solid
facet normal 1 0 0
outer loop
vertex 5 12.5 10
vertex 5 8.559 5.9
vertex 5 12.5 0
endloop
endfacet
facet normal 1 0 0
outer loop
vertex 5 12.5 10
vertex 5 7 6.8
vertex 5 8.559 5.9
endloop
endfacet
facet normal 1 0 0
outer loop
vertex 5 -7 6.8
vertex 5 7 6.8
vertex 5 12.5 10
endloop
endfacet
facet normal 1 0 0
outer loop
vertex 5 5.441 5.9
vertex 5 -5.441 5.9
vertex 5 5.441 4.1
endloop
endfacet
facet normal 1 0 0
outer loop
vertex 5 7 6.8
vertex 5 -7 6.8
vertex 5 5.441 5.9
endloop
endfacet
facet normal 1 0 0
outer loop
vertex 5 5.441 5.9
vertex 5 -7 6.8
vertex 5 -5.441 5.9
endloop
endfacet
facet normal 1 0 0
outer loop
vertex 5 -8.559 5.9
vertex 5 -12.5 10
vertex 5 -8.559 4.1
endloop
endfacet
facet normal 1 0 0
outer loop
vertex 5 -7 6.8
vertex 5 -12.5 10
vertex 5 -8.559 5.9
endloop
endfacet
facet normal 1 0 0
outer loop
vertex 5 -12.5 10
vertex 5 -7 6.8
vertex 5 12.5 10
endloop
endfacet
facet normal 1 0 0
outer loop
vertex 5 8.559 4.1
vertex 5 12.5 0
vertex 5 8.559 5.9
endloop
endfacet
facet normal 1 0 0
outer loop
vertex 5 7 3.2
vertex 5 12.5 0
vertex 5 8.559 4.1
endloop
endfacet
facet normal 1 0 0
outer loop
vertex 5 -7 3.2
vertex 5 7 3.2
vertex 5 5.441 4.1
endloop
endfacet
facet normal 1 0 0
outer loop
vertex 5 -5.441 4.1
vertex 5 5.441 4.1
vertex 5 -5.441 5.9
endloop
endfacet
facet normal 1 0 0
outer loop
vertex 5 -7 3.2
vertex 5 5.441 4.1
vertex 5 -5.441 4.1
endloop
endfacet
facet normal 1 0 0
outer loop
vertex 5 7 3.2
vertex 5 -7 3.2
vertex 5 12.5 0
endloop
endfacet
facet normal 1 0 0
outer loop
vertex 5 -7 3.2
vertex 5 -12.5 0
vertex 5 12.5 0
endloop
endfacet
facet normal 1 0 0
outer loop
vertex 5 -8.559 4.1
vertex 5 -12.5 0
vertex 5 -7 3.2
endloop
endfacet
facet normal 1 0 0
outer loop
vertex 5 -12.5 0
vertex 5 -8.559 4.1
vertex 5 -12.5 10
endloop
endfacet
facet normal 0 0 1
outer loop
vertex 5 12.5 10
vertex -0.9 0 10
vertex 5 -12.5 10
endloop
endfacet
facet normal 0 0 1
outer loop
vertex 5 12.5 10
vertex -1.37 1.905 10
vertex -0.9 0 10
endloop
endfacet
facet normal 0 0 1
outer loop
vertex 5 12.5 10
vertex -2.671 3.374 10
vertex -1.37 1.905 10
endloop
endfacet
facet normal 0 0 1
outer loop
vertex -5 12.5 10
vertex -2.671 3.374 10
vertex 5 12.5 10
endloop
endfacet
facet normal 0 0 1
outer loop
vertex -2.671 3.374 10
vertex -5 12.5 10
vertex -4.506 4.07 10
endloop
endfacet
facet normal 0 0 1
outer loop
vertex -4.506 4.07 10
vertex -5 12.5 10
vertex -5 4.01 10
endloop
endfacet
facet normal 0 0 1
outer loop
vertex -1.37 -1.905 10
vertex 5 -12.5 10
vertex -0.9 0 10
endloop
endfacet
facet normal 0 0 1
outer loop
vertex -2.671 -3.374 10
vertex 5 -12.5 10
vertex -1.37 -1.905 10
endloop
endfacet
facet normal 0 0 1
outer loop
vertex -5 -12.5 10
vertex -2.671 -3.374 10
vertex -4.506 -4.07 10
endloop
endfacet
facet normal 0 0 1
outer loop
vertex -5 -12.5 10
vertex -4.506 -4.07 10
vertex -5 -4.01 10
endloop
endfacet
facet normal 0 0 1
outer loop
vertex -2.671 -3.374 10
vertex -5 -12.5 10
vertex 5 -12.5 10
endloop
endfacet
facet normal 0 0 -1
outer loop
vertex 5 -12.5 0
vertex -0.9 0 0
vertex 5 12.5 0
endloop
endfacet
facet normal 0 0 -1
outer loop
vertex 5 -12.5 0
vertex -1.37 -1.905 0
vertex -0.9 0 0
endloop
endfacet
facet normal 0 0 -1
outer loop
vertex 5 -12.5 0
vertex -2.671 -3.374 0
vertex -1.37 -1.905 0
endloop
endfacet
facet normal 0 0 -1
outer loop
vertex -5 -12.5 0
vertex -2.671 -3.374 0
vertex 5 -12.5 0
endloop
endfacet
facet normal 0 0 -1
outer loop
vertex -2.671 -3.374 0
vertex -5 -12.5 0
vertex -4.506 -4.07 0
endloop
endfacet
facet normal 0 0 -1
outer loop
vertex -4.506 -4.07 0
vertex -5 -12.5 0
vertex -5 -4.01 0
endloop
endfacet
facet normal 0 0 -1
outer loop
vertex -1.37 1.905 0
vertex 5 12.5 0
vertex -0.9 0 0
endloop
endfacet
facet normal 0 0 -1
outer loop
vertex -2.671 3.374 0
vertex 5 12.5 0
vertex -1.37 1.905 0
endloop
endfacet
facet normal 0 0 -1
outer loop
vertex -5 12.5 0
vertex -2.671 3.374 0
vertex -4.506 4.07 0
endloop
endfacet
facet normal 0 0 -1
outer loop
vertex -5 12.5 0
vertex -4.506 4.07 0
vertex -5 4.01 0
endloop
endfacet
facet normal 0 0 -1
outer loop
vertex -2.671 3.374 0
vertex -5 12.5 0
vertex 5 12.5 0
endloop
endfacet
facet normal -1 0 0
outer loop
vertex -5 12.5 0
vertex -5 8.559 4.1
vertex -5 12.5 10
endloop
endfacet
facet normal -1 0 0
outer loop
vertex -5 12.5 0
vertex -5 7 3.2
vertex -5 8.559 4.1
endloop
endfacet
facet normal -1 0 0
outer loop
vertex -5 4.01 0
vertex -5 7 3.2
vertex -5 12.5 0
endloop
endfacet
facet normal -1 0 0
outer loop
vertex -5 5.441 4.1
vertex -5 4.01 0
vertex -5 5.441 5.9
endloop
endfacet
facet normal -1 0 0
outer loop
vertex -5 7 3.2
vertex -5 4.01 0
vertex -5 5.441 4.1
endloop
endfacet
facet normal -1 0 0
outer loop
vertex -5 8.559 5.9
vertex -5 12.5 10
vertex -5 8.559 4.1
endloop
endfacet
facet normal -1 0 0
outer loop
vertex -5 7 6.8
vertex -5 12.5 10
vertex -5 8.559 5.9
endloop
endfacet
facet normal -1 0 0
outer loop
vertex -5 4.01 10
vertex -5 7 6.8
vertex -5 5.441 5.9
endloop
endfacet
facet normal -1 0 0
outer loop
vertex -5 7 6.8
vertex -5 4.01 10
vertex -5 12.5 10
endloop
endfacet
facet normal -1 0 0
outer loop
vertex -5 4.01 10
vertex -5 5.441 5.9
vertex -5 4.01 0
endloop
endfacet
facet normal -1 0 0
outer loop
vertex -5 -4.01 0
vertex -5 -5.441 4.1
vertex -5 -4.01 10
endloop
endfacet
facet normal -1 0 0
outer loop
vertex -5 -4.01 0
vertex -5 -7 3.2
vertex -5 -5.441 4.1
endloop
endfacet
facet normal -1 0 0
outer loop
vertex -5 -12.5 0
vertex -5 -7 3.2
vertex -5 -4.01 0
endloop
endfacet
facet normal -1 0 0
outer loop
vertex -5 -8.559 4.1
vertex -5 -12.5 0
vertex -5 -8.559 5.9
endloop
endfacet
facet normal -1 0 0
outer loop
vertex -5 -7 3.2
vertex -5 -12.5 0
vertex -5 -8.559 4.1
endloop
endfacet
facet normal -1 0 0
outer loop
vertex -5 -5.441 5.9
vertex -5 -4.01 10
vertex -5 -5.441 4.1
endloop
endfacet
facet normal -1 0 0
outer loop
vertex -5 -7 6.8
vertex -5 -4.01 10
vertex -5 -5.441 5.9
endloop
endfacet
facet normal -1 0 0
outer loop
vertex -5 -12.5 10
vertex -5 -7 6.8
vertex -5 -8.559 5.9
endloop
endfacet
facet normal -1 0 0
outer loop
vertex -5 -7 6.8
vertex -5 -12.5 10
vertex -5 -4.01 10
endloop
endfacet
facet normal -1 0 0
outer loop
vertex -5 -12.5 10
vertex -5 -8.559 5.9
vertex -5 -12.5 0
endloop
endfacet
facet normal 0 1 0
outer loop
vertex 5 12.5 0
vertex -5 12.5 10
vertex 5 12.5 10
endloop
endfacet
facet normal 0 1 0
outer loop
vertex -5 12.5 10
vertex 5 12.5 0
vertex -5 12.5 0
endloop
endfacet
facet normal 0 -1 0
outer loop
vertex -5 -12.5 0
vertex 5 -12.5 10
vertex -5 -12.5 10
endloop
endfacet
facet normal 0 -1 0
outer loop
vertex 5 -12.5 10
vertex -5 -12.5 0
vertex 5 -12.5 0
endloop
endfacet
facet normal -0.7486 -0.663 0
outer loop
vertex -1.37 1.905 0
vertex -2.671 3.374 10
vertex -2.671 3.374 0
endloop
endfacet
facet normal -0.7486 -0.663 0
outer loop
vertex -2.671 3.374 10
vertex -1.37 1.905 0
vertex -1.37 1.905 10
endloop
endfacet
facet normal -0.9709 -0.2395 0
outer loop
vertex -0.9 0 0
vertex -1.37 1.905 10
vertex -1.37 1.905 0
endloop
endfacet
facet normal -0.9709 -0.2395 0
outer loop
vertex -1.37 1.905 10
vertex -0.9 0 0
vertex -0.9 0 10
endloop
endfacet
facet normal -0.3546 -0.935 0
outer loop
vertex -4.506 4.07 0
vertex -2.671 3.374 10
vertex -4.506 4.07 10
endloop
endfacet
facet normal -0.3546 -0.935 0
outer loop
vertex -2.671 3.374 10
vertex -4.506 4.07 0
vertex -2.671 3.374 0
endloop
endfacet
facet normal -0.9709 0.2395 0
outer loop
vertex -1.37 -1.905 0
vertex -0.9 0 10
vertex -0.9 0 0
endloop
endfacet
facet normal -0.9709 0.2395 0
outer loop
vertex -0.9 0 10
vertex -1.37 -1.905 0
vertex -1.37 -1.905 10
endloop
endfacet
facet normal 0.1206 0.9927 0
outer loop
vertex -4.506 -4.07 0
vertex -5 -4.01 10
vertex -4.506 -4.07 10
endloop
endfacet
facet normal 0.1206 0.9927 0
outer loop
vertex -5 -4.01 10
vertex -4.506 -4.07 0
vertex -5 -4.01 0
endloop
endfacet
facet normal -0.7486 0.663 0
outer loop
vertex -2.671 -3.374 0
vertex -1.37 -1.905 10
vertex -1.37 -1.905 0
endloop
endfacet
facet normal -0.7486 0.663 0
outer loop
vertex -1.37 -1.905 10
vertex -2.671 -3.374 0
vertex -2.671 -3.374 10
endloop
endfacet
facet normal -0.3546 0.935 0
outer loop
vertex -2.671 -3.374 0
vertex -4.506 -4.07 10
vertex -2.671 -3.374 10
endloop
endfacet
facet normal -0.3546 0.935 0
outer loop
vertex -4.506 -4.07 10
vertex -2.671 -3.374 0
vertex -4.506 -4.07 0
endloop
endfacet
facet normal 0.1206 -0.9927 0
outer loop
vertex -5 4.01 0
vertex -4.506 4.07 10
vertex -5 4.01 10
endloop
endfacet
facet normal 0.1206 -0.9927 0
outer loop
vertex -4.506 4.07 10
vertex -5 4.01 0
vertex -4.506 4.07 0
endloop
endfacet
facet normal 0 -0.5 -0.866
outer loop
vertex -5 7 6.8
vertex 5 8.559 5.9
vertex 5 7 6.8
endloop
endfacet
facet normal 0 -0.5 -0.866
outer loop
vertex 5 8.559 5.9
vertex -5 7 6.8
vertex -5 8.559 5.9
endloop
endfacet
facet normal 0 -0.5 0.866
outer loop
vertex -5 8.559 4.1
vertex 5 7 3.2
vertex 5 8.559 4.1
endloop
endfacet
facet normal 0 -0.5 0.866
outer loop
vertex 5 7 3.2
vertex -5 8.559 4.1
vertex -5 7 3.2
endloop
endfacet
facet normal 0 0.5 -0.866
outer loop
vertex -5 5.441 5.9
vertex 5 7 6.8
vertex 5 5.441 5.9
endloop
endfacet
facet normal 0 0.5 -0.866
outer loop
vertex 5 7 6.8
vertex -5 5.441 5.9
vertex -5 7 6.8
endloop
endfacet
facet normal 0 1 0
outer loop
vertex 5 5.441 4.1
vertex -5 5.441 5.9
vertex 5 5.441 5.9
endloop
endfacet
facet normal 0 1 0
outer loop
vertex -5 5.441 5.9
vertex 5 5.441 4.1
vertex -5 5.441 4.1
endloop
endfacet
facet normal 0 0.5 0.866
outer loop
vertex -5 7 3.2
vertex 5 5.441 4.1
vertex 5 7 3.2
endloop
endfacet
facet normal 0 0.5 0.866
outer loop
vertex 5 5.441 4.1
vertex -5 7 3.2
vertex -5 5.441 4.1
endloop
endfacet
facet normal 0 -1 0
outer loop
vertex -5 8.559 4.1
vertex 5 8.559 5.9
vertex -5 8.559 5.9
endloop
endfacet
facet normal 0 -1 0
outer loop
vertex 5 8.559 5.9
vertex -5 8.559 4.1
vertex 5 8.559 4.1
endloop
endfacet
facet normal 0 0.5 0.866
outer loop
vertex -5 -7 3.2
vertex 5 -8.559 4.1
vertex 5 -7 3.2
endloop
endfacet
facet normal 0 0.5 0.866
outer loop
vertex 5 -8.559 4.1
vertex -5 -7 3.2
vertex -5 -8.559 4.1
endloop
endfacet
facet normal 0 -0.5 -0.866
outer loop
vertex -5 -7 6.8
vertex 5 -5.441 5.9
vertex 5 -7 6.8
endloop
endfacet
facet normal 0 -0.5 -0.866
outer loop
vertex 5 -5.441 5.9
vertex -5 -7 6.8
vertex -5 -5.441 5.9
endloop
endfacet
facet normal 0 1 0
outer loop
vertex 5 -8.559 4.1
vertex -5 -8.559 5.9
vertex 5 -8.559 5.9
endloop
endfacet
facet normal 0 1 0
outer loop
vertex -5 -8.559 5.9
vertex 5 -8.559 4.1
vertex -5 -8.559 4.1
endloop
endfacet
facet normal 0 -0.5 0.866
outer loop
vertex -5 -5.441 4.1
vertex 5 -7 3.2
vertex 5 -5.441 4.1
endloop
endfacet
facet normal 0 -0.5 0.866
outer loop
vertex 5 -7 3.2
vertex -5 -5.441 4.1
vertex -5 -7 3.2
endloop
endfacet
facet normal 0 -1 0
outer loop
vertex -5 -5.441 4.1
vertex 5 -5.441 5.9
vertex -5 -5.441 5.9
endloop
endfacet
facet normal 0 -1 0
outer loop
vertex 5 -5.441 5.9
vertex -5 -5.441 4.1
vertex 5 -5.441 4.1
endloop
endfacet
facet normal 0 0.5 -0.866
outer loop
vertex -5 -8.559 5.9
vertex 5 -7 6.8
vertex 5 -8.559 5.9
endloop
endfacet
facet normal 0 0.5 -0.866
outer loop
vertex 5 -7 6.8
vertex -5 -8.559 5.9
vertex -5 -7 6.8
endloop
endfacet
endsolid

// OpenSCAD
// file: functions.scad
// PRUSA Mendel  
// Functions used in many files
// GNU GPL v3
// Josef Průša
// josefprusa@me.com
// prusadjs.cz
// http://www.reprap.org/wiki/Prusa_Mendel
// http://github.com/prusajr/PrusaMendel


module nut(d,h,horizontal=true){
cornerdiameter =  (d / 2) / cos (180 / 6);
cylinder(h = h, r = cornerdiameter, $fn = 6);
if(horizontal){
for(i = [1:6]){
	rotate([0,0,60*i]) translate([-cornerdiameter-0.2,0,0]) rotate([0,0,-45]) cube(size = [2,2,h]);
}}
}

// Based on nophead research
module polyhole(d,h) {
    n = max(round(2 * d),3);
    rotate([0,0,180])
        cylinder(h = h, r = (d / 2) / cos (180 / n), $fn = n);
}




module roundcorner(diameter){
	difference(){
		cube(size = [diameter,diameter,99], center = false);
		translate(v = [diameter, diameter, 0]) cylinder(h = 100, r=diameter, center=true);
	}
}
// file: metric.scad
// PRUSA Mendel  
// Default metric sizes
// GNU GPL v3
// Josef Průša
// josefprusa@me.com
// prusadjs.cz
// http://www.reprap.org/wiki/Prusa_Mendel
// http://github.com/prusajr/PrusaMendel

// DONT CHANGE THIS FILE! ALTER VALUES IN CONFIGURATION.SCAD INSTEAD

// RODS

threaded_rod_diameter = 8.7;
threaded_rod_diameter_horizontal = 8.7;
smooth_bar_diameter = 8;
smooth_bar_diameter_horizontal = 8.5;

// Nuts and bolts

m8_diameter = 9;
m8_nut_diameter = 14.1;

m4_diameter = 4.5;
m4_nut_diameter = 9;

m3_diameter = 3.6;
m3_nut_diameter = 5.3;
m3_nut_diameter_horizontal = 6.1;

// Bushing holder

bushing_core_diameter = smooth_bar_diameter;
bushing_material_thickness = 1;

// Motors

motor_shaft = 5.5;
// file: configuration.scad
// PRUSA Mendel  
// Configuration file
// GNU GPL v3
// Josef Průša
// josefprusa@me.com
// prusadjs.cz
// http://www.reprap.org/wiki/Prusa_Mendel
// http://github.com/prusajr/PrusaMendel

// PLEASE SELECT ONE OF THE CONFIGURATIONS BELOW
// BY UN-COMMENTING IT

// Uncomment for metric settings
// METRIC METRIC METRIC METRIC METRIC METRIC METRIC METRIC 

include <metric.scad>;

// CUSTOM CUSTOM CUSTOM CUSTOM CUSTOM CUSTOM CUSTOM CUSTOM CUSTOM

thin_wall = 3;


// Linear bearing version
linear = false;
// set false for LM-8UU, true for LM-E-8UU (ignore if linear is set to false)
lme8uu = false;



// CHANGE ONLY THE STUFF YOU KNOW
// IT WILL REPLACE DEFAULT SETTING

// RODS

// threaded_rod_diameter = 0;
// threaded_rod_diameter_horizontal = 0;
// smooth_bar_diameter = 0;
// smooth_bar_diameter_horizontal = 0;

// Nuts and bolts

// m8_diameter = 0;
// m8_nut_diameter = 0;

// m4_diameter = 0;
// m4_nut_diameter = 0;

// m3_diameter = 0;
// m3_nut_diameter = 0;

// Bushing holder

// bushing_core_diameter = smooth_bar_diameter;
// bushing_material_thickness = 0;


///counted stuff
m3_nut_diameter_bigger = ((m3_nut_diameter  / 2) / cos (180 / 6))*2;

// functions 
include <functions.scad>
// main file
// PRUSA Mendel  
// Rod clamp
// GNU GPL v2
// Josef Průša
// josefprusa@me.com
// prusadjs.cz
// http://www.reprap.org/wiki/Prusa_Mendel
// http://github.com/prusajr/PrusaMendel


include <configuration.scad>

/**
 * @name Rod clamp
 * @category Printed
 */  

module rodclamp(){ 
translate([0,0,5]) difference(){
cube([10,25,10],center=true);
translate([-5,0,0]) cylinder(r=4.1,h=20,center=true);
translate([0,7,0]) rotate([0,90,0]) cylinder(r=m3_diameter/2,h=20,center=true);translate([0,-7,0]) rotate([0,90,0]) cylinder(r=m3_diameter/2,h=20,center=true);}
}

rodclamp();
//cube([100,100,0.01],center=true);
